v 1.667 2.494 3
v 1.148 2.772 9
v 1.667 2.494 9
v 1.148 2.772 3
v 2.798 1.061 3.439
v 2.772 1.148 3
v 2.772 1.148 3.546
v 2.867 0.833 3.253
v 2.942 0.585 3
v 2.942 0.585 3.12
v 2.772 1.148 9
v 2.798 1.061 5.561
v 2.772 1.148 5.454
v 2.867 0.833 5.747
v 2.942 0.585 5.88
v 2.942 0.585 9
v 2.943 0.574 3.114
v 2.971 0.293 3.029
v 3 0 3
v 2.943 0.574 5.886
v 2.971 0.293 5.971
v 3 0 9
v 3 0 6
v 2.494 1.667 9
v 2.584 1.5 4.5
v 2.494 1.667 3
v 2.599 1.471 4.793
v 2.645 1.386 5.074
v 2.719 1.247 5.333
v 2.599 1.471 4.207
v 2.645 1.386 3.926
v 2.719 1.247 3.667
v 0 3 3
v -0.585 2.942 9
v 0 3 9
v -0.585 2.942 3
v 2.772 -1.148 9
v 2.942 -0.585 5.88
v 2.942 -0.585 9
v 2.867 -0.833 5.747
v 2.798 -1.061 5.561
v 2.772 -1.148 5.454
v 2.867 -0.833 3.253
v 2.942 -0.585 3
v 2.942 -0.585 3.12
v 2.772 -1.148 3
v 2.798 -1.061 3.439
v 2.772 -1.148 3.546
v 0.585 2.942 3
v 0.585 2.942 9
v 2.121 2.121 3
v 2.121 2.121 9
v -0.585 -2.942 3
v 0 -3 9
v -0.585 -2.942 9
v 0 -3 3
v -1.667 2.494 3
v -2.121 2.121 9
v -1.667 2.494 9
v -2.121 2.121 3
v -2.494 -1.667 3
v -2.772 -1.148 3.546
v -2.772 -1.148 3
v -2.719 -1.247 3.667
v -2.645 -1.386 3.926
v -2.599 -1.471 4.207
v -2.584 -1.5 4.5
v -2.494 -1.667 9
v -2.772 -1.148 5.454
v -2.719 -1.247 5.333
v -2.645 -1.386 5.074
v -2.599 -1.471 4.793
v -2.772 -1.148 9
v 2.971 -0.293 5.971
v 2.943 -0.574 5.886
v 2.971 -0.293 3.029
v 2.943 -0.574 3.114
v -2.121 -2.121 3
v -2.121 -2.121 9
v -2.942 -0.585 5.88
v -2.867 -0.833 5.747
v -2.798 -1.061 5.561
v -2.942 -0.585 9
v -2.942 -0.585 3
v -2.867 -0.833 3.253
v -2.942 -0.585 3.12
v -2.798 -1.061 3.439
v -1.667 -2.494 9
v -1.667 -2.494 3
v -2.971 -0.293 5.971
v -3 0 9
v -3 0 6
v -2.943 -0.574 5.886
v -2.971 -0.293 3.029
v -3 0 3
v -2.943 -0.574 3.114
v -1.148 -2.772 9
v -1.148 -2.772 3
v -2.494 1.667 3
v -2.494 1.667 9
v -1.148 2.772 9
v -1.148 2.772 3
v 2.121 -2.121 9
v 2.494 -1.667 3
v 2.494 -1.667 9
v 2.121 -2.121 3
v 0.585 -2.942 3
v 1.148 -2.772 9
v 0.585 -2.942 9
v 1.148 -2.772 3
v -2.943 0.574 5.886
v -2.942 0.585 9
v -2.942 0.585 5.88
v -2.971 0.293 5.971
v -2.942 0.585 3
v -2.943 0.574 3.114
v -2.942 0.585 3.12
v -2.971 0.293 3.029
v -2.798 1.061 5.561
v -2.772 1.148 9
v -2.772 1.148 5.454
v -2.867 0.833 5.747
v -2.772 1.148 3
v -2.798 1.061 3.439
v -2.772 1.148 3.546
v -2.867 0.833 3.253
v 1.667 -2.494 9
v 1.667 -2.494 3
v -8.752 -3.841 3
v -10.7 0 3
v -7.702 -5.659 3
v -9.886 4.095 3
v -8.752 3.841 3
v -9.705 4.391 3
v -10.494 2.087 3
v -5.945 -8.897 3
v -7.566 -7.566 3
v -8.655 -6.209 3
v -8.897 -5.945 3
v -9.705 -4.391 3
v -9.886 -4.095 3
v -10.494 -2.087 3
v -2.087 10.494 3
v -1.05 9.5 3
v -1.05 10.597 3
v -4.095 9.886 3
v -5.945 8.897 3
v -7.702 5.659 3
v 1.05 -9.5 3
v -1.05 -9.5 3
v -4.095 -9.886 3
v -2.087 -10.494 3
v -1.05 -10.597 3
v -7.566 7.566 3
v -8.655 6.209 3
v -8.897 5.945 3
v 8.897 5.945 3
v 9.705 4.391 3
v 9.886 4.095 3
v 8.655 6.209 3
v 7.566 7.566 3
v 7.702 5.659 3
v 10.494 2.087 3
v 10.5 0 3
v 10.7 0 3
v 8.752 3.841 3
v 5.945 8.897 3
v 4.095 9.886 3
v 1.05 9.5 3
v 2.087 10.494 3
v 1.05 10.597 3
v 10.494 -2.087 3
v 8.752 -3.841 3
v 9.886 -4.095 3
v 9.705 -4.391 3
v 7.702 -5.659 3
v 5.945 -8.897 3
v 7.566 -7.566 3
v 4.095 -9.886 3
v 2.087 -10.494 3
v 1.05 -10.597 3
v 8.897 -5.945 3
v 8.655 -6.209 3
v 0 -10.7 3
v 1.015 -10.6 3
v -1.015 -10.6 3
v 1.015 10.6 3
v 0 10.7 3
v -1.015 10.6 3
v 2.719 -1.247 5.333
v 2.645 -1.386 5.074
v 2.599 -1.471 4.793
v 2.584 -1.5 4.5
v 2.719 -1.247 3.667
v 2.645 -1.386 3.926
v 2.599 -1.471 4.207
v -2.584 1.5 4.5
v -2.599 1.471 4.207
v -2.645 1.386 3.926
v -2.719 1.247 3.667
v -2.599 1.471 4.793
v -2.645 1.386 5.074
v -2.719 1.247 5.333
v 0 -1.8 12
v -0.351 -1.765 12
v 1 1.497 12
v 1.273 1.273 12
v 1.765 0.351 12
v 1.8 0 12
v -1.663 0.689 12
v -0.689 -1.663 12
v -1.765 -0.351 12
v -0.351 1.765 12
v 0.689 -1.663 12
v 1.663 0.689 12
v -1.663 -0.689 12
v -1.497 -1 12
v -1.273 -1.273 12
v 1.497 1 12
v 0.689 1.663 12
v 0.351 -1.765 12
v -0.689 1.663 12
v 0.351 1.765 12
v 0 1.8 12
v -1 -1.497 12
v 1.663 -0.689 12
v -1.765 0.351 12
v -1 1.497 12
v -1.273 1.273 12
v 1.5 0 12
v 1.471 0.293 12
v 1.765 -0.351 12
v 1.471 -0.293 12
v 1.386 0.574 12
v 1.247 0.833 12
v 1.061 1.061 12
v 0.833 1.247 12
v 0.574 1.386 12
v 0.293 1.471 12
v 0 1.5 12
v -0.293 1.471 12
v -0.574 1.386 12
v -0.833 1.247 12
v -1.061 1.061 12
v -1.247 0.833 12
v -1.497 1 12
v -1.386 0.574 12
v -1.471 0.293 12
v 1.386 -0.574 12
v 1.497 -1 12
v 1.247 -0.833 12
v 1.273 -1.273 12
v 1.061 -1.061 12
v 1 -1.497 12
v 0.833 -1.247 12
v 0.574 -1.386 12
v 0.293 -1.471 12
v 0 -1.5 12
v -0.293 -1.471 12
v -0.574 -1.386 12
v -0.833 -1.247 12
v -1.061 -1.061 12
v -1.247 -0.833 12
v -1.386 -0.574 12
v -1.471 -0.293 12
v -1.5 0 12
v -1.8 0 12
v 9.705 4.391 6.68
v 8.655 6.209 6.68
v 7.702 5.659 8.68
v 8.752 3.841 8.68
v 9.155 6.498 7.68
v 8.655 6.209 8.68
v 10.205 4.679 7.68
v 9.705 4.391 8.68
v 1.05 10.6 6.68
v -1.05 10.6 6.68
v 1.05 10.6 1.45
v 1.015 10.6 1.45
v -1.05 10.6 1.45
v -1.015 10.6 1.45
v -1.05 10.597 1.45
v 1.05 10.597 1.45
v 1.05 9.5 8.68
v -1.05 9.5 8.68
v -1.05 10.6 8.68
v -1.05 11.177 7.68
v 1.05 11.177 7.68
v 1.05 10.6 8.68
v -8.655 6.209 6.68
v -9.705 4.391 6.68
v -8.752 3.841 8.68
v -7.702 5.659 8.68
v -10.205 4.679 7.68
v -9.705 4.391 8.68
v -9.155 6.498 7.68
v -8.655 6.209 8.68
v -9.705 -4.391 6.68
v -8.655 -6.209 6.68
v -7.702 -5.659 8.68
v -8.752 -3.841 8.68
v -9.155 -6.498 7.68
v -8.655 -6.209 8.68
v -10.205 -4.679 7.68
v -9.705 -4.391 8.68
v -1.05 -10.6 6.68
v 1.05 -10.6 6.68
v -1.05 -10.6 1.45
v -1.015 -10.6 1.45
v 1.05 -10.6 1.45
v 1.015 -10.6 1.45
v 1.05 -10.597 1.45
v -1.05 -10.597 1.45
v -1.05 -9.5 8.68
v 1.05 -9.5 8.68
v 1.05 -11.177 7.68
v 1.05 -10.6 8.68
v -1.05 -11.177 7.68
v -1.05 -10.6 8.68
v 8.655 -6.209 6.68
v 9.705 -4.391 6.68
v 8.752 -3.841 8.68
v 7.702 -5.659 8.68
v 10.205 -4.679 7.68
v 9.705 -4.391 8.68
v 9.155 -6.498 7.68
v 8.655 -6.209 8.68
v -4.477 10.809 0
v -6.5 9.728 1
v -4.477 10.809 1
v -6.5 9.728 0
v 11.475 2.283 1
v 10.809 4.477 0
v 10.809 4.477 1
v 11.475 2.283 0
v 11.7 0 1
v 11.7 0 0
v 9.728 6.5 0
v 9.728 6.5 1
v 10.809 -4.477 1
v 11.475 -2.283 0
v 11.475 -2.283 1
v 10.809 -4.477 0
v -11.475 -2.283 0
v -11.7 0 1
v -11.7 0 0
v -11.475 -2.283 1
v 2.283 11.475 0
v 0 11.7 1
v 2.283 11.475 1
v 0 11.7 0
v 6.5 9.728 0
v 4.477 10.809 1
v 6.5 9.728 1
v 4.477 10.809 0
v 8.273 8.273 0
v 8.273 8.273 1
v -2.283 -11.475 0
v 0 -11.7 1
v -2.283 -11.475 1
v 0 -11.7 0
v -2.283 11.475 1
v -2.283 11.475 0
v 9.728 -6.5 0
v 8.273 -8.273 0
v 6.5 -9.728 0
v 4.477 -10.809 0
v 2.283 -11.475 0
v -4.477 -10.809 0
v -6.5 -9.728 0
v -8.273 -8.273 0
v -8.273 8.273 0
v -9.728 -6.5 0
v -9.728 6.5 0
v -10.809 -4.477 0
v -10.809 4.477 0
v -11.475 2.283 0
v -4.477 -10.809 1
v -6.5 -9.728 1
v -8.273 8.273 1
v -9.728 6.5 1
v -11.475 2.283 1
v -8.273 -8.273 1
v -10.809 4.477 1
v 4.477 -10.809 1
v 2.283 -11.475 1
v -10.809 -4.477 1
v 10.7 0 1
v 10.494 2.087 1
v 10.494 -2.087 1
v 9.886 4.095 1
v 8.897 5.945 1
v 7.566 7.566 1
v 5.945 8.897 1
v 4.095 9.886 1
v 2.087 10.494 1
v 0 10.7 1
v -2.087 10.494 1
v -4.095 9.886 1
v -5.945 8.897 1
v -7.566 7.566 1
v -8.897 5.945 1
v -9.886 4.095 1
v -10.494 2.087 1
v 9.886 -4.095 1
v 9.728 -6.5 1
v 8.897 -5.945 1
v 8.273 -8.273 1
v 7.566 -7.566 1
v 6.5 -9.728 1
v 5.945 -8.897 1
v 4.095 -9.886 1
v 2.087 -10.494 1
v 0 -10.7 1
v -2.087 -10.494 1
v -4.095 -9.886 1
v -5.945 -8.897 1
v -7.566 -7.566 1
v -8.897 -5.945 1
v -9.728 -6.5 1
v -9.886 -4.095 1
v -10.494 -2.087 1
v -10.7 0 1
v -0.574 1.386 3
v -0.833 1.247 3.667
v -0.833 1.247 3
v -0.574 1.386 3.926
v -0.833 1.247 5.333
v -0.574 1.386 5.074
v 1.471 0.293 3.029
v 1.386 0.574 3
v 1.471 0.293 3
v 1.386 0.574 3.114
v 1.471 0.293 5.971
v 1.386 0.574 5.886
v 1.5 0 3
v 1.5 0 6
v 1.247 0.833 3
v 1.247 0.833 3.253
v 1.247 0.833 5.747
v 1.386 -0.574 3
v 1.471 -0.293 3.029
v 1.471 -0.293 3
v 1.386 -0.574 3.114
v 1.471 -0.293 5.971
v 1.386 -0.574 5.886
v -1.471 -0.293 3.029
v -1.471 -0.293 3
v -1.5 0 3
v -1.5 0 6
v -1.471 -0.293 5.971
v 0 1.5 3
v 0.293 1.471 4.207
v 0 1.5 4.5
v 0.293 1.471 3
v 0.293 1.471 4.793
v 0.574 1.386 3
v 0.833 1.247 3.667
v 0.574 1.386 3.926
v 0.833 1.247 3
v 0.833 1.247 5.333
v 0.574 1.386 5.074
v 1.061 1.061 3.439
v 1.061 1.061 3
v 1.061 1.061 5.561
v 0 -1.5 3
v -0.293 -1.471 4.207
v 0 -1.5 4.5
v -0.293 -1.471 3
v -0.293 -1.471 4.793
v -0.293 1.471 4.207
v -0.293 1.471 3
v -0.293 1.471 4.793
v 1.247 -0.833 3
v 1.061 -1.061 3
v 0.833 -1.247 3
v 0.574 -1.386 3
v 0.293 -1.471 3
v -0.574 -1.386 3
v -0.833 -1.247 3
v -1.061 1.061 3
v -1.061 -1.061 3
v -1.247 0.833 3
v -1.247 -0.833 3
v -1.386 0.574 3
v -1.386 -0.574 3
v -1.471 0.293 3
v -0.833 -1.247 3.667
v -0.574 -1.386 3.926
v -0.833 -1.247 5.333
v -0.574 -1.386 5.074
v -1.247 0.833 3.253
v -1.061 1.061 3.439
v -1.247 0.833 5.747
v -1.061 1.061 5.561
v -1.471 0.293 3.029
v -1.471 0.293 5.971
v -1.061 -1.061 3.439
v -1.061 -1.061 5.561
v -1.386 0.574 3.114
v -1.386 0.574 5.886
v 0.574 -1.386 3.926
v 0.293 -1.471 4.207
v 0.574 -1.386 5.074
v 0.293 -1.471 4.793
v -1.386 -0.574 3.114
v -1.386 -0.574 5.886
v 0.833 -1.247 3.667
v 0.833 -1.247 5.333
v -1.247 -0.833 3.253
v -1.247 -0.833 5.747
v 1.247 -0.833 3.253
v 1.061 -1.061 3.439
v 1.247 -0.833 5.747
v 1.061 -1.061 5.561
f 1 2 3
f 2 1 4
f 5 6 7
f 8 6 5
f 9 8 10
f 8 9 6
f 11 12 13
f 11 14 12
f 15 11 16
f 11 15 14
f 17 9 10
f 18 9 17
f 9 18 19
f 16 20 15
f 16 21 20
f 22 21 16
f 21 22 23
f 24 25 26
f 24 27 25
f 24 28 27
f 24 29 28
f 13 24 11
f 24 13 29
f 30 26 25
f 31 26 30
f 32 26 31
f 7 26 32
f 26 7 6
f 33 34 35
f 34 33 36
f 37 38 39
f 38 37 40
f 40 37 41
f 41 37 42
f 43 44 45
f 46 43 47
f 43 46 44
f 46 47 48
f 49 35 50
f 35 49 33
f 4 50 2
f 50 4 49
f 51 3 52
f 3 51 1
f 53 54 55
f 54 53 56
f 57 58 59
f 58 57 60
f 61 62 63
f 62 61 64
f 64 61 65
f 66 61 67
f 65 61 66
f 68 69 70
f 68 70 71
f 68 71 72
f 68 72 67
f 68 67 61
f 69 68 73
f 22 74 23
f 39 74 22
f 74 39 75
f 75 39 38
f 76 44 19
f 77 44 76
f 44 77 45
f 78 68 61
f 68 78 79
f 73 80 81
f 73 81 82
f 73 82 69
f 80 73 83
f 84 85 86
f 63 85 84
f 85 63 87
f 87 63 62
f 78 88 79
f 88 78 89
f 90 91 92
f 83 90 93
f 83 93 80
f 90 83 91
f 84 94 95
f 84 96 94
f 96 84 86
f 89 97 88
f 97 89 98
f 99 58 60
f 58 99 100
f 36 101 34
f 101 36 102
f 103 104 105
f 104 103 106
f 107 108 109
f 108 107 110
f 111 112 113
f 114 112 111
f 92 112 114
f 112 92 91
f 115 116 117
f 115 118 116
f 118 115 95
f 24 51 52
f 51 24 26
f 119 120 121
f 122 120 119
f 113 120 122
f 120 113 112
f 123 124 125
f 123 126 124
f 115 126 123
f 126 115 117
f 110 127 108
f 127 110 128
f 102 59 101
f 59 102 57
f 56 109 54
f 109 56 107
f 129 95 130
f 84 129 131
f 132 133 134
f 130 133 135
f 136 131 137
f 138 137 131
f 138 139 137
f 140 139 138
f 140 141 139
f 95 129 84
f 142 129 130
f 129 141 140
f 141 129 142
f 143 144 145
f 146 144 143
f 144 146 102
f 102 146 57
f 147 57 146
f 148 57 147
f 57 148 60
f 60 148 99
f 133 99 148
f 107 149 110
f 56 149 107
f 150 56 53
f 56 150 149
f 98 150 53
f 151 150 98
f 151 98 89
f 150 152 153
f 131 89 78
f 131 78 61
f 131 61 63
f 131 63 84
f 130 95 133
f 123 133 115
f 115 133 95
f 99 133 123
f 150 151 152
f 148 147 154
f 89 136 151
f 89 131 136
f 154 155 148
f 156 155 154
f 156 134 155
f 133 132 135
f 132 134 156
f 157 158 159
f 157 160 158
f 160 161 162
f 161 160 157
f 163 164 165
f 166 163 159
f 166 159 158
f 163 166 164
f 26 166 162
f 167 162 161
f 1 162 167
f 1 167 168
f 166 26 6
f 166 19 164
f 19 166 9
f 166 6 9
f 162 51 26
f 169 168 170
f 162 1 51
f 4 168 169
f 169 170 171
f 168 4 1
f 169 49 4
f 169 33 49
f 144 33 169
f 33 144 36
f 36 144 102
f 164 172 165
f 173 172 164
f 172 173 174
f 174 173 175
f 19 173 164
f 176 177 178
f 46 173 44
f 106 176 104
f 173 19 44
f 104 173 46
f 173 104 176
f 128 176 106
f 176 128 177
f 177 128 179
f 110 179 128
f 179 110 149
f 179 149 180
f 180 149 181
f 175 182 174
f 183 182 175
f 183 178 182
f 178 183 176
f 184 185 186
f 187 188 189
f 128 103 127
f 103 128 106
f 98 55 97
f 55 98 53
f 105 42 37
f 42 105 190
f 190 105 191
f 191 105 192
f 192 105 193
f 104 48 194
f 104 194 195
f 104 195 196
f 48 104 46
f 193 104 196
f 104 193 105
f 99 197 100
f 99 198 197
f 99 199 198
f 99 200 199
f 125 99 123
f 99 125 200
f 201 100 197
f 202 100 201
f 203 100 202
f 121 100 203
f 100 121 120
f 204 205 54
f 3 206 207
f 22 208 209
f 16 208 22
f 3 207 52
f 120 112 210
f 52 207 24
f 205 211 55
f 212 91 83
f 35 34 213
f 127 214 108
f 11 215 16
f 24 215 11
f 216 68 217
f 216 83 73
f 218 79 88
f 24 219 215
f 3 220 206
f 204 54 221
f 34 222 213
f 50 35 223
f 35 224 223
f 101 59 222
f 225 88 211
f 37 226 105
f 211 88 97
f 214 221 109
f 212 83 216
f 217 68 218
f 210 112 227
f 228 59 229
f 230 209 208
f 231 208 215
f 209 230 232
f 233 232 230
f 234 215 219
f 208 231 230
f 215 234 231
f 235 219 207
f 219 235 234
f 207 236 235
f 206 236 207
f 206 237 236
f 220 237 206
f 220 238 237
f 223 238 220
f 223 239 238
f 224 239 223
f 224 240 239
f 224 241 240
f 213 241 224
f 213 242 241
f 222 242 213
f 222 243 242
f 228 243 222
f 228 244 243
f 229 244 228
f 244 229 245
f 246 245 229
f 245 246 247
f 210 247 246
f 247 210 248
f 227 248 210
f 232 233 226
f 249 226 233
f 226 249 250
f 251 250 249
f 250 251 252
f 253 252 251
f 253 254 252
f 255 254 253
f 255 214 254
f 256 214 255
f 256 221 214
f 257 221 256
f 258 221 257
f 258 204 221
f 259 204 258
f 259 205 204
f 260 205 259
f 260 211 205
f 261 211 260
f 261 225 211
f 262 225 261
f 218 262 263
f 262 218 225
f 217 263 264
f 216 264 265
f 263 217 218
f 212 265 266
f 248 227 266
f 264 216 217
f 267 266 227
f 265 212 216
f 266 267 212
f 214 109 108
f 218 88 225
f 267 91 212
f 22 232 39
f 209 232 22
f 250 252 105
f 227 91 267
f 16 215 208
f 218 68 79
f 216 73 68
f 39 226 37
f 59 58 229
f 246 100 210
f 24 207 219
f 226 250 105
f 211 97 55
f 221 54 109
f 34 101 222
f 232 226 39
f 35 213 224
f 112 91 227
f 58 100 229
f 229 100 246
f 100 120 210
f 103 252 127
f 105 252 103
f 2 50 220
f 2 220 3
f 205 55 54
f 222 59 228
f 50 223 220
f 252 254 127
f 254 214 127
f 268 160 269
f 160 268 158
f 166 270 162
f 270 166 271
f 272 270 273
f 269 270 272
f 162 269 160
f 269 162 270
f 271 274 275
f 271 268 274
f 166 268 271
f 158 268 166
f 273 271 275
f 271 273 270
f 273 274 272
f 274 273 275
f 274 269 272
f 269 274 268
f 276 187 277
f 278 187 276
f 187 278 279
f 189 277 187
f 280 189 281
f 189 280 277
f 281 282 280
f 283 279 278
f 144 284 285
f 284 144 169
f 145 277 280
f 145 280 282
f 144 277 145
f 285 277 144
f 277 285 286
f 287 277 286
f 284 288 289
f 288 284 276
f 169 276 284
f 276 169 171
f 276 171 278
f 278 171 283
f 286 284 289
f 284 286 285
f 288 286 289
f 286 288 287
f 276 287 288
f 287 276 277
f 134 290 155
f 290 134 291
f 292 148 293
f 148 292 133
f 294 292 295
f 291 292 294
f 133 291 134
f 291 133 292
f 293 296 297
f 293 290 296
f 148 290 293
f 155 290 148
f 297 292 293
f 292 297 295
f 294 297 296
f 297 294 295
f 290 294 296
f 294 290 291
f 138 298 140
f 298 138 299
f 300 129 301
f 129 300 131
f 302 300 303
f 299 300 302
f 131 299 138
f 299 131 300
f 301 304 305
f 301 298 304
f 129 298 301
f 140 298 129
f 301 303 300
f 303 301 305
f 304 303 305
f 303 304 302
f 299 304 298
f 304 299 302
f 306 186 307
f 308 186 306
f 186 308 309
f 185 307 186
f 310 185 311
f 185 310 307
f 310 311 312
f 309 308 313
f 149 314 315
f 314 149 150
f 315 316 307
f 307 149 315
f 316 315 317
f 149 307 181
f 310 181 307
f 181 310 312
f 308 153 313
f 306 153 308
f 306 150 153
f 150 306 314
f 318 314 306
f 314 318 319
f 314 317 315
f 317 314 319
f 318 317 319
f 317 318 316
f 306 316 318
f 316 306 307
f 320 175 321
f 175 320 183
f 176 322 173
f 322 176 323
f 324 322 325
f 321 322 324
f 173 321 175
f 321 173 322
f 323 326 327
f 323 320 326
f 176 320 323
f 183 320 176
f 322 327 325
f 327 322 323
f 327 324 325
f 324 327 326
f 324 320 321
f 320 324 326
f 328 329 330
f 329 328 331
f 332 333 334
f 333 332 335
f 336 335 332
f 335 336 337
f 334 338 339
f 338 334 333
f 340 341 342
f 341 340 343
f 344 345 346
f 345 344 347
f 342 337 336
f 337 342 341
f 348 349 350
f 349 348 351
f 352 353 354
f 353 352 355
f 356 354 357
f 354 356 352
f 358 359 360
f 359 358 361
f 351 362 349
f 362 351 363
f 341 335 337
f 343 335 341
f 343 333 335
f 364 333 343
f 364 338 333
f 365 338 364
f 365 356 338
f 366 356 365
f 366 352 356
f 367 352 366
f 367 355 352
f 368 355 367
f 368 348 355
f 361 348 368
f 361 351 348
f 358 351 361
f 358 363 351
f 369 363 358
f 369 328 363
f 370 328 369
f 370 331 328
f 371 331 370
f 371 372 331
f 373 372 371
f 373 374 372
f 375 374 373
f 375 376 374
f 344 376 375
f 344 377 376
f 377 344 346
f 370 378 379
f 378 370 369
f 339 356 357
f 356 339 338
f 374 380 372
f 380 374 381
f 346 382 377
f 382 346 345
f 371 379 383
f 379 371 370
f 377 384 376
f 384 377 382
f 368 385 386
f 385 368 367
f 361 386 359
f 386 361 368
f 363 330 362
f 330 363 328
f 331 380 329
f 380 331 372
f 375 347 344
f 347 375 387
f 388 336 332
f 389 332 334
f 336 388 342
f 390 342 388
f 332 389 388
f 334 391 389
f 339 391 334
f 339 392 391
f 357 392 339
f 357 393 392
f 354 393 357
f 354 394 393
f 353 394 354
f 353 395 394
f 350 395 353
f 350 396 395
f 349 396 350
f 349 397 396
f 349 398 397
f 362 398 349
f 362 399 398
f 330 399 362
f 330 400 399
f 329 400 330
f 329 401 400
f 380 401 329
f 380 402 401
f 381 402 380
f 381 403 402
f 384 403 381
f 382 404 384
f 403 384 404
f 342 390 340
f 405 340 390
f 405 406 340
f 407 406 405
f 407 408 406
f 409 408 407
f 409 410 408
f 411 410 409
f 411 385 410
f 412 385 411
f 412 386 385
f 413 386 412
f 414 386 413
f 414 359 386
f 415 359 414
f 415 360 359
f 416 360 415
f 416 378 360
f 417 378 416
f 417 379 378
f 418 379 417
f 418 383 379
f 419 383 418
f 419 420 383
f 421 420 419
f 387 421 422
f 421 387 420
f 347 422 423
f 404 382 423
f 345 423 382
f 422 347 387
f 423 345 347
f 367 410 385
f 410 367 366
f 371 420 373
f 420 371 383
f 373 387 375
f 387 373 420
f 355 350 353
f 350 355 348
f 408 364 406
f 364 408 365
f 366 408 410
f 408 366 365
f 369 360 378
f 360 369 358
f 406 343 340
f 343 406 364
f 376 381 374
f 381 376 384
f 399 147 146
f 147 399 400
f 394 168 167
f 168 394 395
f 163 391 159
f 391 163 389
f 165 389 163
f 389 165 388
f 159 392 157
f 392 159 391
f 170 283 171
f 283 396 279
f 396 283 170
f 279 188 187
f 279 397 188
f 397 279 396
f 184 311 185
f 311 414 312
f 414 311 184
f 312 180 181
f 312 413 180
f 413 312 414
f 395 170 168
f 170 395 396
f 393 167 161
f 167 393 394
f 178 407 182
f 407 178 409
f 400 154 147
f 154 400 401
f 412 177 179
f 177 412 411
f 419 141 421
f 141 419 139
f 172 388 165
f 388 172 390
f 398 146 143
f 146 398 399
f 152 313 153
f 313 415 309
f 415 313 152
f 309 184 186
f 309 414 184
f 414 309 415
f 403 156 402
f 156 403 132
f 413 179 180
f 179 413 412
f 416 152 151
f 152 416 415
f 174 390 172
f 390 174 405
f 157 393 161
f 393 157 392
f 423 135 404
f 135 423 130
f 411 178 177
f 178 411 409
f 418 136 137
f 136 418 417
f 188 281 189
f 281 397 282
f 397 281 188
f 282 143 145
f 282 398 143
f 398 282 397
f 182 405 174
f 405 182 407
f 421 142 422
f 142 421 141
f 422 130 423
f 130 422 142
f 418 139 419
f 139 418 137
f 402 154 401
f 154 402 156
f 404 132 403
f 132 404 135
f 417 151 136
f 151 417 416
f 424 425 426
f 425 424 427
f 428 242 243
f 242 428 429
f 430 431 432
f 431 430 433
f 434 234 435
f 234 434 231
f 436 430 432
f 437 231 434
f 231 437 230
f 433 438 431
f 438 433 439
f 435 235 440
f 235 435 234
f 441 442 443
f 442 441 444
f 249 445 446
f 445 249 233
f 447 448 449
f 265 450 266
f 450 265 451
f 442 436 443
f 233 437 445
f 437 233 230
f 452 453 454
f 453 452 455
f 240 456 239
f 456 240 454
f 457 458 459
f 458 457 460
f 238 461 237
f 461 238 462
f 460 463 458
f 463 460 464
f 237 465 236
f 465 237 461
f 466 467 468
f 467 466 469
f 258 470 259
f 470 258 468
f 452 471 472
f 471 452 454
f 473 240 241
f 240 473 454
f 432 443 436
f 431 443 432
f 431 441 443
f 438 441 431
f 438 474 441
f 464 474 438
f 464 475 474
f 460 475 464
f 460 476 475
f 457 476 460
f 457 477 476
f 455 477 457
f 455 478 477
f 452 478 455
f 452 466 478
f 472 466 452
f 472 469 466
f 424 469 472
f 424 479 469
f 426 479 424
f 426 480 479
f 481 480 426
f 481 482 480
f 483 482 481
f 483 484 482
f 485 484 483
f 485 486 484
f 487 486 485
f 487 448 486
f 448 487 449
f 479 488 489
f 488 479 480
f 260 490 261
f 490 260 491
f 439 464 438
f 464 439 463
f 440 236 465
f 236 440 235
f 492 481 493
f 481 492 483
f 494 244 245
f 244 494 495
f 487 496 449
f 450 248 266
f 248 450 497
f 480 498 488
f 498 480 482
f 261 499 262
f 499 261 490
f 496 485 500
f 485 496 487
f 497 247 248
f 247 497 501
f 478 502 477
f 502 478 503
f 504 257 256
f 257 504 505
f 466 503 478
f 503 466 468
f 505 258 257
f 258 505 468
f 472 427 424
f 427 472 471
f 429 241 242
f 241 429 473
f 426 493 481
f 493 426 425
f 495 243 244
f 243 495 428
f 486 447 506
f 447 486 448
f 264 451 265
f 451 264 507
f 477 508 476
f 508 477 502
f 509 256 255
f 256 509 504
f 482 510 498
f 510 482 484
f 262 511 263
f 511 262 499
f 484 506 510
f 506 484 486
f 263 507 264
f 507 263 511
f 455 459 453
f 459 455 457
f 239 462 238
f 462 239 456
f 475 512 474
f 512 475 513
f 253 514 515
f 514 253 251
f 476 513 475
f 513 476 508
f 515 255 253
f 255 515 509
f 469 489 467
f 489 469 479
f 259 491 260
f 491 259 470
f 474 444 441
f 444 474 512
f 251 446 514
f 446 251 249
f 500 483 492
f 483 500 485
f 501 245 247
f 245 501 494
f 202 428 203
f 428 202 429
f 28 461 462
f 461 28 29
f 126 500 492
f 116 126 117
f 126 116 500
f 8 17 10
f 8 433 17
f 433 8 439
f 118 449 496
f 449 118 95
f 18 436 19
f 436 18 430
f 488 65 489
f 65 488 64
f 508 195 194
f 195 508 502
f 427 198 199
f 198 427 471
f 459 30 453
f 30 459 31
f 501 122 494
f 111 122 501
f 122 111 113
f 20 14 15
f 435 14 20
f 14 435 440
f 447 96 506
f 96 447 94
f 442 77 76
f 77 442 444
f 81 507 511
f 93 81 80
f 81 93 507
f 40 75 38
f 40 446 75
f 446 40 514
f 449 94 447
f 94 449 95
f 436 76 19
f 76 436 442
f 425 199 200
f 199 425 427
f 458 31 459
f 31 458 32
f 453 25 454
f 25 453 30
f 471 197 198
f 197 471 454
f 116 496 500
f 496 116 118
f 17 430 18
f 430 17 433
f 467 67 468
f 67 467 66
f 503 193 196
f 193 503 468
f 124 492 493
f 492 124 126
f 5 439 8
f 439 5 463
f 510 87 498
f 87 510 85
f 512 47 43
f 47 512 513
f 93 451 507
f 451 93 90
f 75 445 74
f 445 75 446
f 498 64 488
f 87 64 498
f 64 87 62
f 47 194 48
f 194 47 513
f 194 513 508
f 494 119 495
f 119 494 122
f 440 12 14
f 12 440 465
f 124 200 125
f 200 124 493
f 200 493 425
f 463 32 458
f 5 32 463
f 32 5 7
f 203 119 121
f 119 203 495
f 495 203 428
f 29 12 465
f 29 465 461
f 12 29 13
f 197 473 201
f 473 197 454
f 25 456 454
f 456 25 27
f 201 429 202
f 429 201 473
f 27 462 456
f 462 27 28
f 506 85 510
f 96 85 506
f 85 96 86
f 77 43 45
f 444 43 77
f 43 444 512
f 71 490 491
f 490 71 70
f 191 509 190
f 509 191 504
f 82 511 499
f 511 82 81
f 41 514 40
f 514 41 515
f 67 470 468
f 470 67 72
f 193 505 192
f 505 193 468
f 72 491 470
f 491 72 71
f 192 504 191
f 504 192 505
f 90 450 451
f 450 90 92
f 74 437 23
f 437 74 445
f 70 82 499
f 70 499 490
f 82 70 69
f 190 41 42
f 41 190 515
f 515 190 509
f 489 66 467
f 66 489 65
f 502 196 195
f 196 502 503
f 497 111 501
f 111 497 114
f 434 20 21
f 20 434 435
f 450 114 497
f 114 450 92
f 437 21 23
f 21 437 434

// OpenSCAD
// file: ../stamp_generated.scad
// AUTO-GENERATED by scripts/Export-OpenScadStl.ps1 - do not edit by hand
// Source: print-stamp-config.json

info_stamp_line1 = "Verminology";
info_stamp_line2 = "Liquid Bait Station";
info_stamp_line3 = "v2.4.1 Prototype";
reservoir_stamp_bottom = false;
station_stamp_bottom = true;
needle_insert_export_stamp_bottom = false;
needle_gasket_export_stamp_bottom = false;
needle_seal_stamp_bottom = false;
// main file
// Needle insert + gasket ring modules. Include this (not `use`) so common.scad loads.
// F5 / STL: open this file directly — draws needle_insert() unless needle_insert_as_library is true before include.
// Base: union of two cylinders — bottom 1 mm @ inner_bait_barrier_id, upper 2 mm @ bottom OD − 2 mm (diametric).

include <common.scad>

// TPU torus: relaxed inner R < upper step R, outer R > upper step R. Centered on z=0; mate with translate(…, needle_gasket_assembly_z).
module needle_gasket_ring() {
    ri = needle_gasket_relaxed_inner_r;
    ro = needle_gasket_relaxed_outer_r;
    hz = needle_gasket_relaxed_z_half;
    render_if_needed()
        rotate_extrude(angle = 360, convexity = 4)
            polygon([
                [ri, -hz],
                [ro, -hz],
                [ro, hz],
                [ri, hz],
            ]);
}

// Six flex posts on upper base step (gasket land OD); top barb: two ramps at needle_insert_clip_top_barb_slope_deg, extruded across w.
module needle_insert_retention_clip_top_barb(L, w, h_barb, apex_r) {
    hm = h_barb / 2;
    translate([0, w / 2, 0])
        rotate([90, 0, 0])
            linear_extrude(height = w, convexity = 4)
                polygon([
                    [0, 0],
                    [L, 0],
                    [L + apex_r, hm],
                    [L, h_barb],
                    [0, h_barb],
                ]);
}

module needle_insert_retention_clips() {
    R = needle_insert_gasket_land_od / 2;
    w = needle_insert_clip_tangent_width_mm;
    ad = needle_insert_clip_anchor_depth_mm;
    stem = needle_insert_clip_stem_radial_mm;
    L = ad + stem;
    h_barb = needle_insert_clip_top_barb_h_mm;
    apex_r = needle_insert_clip_top_barb_apex_radial_mm;
    z_step = needle_insert_base_bottom_h;
    z0 = needle_insert_clip_z0_above_gasket_step_mm + needle_insert_clip_stem_bottom_trim_mm;
    z_body_top = needle_insert_clip_body_z_top - z_step;
    z_barb_base = z_body_top - needle_insert_clip_top_barb_drop_mm;
    ri = needle_insert_clip_retention_radial_inset_mm;
    assert(z_barb_base > z0 + 0.05, "barb drop too large vs stem height");
    for (i = [0 : needle_insert_clip_count - 1])
        rotate([0, 0, needle_insert_clip_phase_deg + i * (360 / needle_insert_clip_count)])
            render_if_needed()
                translate([0, 0, z_step])
                    union() {
                        translate([R - L - ri, -w / 2, z0])
                            cube([L, w, z_barb_base - z0]);
                        translate([R - L - ri, 0, z_barb_base])
                            needle_insert_retention_clip_top_barb(L, w, h_barb, apex_r);
                    }
}

// Lower base step — plain cylinder only (no groove, no difference).
module needle_insert_base_bottom_cylinder() {
    cylinder(h = needle_insert_base_bottom_h, d = needle_insert_base_bottom_od);
}

// Upper base step — second cylinder only (stacked on bottom).
module needle_insert_base_upper_cylinder() {
    translate([0, 0, needle_insert_base_bottom_h])
        cylinder(h = needle_insert_base_gasket_step_h, d = needle_insert_gasket_land_od);
}

module needle_insert_channels() {
    // Vertical: from bottom of lateral port up (not through z=0 below lateral).
    vb = max(0, pin_channel_z_bottom);
    vh = pin_top + 0.5 - vb;
    translate([0, 0, vb])
        cylinder(h = vh, d = pin_channel_dia);
    translate([pin_tunnel_x_center, 0, pin_tunnel_z])
        rotate([0, 90, 0])
            cylinder(h = pin_tunnel_reach, d = pin_channel_dia, center = true);
}

// Solid: union(two base cylinders, pin…); channels subtract through the stack.
module needle_insert() {
    sh = pin_top - pin_tip_taper_h - needle_insert_disk_h;
    render_if_needed()
        difference() {
            union() {
                needle_insert_base_bottom_cylinder();
                needle_insert_base_upper_cylinder();
                translate([0, 0, needle_insert_disk_h]) {
                    cylinder(h = sh, d = pin_dia);
                    translate([0, 0, sh])
                        cylinder(h = pin_tip_taper_h, d1 = pin_dia, d2 = pin_tip_od);
                }
                if (needle_insert_retention_clips_enabled)
                    needle_insert_retention_clips();
            }
            needle_insert_channels();
        }
}

// Pocket: max of (bottom OD, land + barb) + clearance — not id2+c+apex as extra (that oversize erased inner barrier ring).
// Capped below inner barrier ring OD so the subtract cannot hollow the full annulus (watertight wall).
module needle_insert_pocket() {
    c = needle_insert_pocket_clearance;
    ze = needle_insert_pocket_z_extra;
    r_body = needle_insert_base_bottom_od / 2 + c;
    r_barb = needle_insert_retention_clips_enabled
        ? needle_insert_gasket_land_od / 2 + needle_insert_clip_top_barb_apex_radial_mm + c
            - needle_insert_clip_retention_radial_inset_mm
        : 0;
    r_need = max(r_body, r_barb);
    r_cap = inner_bait_barrier_od / 2 - needle_insert_pocket_inner_barrier_min_wall_mm;
    r_clip = min(r_need, r_cap);
    assert(r_need <= r_cap + 0.02, "needle pocket exceeds inner barrier OD cap — reduce barb apex or slope");
    z_barb = needle_insert_retention_clips_enabled ? needle_insert_clip_top_barb_h_mm : 0;
    z_drop = needle_insert_retention_clips_enabled ? needle_insert_clip_top_barb_drop_mm : 0;
    z_clip_top = max(
        inner_barrier_rail_z_top + 0.08,
        needle_insert_clip_body_z_top - z_drop + z_barb + needle_insert_pocket_z_above_clip_post_mm);
    translate([0, 0, -0.02])
        union() {
            cylinder(h = z_clip_top + 0.02 + ze, r = r_clip);
            translate([0, 0, z_clip_top])
                cylinder(h = pin_top - z_clip_top + 0.5 + ze, d = pin_dia + 2 * c);
        }
}

if (is_undef(needle_insert_as_library) || !needle_insert_as_library)
    needle_insert();
